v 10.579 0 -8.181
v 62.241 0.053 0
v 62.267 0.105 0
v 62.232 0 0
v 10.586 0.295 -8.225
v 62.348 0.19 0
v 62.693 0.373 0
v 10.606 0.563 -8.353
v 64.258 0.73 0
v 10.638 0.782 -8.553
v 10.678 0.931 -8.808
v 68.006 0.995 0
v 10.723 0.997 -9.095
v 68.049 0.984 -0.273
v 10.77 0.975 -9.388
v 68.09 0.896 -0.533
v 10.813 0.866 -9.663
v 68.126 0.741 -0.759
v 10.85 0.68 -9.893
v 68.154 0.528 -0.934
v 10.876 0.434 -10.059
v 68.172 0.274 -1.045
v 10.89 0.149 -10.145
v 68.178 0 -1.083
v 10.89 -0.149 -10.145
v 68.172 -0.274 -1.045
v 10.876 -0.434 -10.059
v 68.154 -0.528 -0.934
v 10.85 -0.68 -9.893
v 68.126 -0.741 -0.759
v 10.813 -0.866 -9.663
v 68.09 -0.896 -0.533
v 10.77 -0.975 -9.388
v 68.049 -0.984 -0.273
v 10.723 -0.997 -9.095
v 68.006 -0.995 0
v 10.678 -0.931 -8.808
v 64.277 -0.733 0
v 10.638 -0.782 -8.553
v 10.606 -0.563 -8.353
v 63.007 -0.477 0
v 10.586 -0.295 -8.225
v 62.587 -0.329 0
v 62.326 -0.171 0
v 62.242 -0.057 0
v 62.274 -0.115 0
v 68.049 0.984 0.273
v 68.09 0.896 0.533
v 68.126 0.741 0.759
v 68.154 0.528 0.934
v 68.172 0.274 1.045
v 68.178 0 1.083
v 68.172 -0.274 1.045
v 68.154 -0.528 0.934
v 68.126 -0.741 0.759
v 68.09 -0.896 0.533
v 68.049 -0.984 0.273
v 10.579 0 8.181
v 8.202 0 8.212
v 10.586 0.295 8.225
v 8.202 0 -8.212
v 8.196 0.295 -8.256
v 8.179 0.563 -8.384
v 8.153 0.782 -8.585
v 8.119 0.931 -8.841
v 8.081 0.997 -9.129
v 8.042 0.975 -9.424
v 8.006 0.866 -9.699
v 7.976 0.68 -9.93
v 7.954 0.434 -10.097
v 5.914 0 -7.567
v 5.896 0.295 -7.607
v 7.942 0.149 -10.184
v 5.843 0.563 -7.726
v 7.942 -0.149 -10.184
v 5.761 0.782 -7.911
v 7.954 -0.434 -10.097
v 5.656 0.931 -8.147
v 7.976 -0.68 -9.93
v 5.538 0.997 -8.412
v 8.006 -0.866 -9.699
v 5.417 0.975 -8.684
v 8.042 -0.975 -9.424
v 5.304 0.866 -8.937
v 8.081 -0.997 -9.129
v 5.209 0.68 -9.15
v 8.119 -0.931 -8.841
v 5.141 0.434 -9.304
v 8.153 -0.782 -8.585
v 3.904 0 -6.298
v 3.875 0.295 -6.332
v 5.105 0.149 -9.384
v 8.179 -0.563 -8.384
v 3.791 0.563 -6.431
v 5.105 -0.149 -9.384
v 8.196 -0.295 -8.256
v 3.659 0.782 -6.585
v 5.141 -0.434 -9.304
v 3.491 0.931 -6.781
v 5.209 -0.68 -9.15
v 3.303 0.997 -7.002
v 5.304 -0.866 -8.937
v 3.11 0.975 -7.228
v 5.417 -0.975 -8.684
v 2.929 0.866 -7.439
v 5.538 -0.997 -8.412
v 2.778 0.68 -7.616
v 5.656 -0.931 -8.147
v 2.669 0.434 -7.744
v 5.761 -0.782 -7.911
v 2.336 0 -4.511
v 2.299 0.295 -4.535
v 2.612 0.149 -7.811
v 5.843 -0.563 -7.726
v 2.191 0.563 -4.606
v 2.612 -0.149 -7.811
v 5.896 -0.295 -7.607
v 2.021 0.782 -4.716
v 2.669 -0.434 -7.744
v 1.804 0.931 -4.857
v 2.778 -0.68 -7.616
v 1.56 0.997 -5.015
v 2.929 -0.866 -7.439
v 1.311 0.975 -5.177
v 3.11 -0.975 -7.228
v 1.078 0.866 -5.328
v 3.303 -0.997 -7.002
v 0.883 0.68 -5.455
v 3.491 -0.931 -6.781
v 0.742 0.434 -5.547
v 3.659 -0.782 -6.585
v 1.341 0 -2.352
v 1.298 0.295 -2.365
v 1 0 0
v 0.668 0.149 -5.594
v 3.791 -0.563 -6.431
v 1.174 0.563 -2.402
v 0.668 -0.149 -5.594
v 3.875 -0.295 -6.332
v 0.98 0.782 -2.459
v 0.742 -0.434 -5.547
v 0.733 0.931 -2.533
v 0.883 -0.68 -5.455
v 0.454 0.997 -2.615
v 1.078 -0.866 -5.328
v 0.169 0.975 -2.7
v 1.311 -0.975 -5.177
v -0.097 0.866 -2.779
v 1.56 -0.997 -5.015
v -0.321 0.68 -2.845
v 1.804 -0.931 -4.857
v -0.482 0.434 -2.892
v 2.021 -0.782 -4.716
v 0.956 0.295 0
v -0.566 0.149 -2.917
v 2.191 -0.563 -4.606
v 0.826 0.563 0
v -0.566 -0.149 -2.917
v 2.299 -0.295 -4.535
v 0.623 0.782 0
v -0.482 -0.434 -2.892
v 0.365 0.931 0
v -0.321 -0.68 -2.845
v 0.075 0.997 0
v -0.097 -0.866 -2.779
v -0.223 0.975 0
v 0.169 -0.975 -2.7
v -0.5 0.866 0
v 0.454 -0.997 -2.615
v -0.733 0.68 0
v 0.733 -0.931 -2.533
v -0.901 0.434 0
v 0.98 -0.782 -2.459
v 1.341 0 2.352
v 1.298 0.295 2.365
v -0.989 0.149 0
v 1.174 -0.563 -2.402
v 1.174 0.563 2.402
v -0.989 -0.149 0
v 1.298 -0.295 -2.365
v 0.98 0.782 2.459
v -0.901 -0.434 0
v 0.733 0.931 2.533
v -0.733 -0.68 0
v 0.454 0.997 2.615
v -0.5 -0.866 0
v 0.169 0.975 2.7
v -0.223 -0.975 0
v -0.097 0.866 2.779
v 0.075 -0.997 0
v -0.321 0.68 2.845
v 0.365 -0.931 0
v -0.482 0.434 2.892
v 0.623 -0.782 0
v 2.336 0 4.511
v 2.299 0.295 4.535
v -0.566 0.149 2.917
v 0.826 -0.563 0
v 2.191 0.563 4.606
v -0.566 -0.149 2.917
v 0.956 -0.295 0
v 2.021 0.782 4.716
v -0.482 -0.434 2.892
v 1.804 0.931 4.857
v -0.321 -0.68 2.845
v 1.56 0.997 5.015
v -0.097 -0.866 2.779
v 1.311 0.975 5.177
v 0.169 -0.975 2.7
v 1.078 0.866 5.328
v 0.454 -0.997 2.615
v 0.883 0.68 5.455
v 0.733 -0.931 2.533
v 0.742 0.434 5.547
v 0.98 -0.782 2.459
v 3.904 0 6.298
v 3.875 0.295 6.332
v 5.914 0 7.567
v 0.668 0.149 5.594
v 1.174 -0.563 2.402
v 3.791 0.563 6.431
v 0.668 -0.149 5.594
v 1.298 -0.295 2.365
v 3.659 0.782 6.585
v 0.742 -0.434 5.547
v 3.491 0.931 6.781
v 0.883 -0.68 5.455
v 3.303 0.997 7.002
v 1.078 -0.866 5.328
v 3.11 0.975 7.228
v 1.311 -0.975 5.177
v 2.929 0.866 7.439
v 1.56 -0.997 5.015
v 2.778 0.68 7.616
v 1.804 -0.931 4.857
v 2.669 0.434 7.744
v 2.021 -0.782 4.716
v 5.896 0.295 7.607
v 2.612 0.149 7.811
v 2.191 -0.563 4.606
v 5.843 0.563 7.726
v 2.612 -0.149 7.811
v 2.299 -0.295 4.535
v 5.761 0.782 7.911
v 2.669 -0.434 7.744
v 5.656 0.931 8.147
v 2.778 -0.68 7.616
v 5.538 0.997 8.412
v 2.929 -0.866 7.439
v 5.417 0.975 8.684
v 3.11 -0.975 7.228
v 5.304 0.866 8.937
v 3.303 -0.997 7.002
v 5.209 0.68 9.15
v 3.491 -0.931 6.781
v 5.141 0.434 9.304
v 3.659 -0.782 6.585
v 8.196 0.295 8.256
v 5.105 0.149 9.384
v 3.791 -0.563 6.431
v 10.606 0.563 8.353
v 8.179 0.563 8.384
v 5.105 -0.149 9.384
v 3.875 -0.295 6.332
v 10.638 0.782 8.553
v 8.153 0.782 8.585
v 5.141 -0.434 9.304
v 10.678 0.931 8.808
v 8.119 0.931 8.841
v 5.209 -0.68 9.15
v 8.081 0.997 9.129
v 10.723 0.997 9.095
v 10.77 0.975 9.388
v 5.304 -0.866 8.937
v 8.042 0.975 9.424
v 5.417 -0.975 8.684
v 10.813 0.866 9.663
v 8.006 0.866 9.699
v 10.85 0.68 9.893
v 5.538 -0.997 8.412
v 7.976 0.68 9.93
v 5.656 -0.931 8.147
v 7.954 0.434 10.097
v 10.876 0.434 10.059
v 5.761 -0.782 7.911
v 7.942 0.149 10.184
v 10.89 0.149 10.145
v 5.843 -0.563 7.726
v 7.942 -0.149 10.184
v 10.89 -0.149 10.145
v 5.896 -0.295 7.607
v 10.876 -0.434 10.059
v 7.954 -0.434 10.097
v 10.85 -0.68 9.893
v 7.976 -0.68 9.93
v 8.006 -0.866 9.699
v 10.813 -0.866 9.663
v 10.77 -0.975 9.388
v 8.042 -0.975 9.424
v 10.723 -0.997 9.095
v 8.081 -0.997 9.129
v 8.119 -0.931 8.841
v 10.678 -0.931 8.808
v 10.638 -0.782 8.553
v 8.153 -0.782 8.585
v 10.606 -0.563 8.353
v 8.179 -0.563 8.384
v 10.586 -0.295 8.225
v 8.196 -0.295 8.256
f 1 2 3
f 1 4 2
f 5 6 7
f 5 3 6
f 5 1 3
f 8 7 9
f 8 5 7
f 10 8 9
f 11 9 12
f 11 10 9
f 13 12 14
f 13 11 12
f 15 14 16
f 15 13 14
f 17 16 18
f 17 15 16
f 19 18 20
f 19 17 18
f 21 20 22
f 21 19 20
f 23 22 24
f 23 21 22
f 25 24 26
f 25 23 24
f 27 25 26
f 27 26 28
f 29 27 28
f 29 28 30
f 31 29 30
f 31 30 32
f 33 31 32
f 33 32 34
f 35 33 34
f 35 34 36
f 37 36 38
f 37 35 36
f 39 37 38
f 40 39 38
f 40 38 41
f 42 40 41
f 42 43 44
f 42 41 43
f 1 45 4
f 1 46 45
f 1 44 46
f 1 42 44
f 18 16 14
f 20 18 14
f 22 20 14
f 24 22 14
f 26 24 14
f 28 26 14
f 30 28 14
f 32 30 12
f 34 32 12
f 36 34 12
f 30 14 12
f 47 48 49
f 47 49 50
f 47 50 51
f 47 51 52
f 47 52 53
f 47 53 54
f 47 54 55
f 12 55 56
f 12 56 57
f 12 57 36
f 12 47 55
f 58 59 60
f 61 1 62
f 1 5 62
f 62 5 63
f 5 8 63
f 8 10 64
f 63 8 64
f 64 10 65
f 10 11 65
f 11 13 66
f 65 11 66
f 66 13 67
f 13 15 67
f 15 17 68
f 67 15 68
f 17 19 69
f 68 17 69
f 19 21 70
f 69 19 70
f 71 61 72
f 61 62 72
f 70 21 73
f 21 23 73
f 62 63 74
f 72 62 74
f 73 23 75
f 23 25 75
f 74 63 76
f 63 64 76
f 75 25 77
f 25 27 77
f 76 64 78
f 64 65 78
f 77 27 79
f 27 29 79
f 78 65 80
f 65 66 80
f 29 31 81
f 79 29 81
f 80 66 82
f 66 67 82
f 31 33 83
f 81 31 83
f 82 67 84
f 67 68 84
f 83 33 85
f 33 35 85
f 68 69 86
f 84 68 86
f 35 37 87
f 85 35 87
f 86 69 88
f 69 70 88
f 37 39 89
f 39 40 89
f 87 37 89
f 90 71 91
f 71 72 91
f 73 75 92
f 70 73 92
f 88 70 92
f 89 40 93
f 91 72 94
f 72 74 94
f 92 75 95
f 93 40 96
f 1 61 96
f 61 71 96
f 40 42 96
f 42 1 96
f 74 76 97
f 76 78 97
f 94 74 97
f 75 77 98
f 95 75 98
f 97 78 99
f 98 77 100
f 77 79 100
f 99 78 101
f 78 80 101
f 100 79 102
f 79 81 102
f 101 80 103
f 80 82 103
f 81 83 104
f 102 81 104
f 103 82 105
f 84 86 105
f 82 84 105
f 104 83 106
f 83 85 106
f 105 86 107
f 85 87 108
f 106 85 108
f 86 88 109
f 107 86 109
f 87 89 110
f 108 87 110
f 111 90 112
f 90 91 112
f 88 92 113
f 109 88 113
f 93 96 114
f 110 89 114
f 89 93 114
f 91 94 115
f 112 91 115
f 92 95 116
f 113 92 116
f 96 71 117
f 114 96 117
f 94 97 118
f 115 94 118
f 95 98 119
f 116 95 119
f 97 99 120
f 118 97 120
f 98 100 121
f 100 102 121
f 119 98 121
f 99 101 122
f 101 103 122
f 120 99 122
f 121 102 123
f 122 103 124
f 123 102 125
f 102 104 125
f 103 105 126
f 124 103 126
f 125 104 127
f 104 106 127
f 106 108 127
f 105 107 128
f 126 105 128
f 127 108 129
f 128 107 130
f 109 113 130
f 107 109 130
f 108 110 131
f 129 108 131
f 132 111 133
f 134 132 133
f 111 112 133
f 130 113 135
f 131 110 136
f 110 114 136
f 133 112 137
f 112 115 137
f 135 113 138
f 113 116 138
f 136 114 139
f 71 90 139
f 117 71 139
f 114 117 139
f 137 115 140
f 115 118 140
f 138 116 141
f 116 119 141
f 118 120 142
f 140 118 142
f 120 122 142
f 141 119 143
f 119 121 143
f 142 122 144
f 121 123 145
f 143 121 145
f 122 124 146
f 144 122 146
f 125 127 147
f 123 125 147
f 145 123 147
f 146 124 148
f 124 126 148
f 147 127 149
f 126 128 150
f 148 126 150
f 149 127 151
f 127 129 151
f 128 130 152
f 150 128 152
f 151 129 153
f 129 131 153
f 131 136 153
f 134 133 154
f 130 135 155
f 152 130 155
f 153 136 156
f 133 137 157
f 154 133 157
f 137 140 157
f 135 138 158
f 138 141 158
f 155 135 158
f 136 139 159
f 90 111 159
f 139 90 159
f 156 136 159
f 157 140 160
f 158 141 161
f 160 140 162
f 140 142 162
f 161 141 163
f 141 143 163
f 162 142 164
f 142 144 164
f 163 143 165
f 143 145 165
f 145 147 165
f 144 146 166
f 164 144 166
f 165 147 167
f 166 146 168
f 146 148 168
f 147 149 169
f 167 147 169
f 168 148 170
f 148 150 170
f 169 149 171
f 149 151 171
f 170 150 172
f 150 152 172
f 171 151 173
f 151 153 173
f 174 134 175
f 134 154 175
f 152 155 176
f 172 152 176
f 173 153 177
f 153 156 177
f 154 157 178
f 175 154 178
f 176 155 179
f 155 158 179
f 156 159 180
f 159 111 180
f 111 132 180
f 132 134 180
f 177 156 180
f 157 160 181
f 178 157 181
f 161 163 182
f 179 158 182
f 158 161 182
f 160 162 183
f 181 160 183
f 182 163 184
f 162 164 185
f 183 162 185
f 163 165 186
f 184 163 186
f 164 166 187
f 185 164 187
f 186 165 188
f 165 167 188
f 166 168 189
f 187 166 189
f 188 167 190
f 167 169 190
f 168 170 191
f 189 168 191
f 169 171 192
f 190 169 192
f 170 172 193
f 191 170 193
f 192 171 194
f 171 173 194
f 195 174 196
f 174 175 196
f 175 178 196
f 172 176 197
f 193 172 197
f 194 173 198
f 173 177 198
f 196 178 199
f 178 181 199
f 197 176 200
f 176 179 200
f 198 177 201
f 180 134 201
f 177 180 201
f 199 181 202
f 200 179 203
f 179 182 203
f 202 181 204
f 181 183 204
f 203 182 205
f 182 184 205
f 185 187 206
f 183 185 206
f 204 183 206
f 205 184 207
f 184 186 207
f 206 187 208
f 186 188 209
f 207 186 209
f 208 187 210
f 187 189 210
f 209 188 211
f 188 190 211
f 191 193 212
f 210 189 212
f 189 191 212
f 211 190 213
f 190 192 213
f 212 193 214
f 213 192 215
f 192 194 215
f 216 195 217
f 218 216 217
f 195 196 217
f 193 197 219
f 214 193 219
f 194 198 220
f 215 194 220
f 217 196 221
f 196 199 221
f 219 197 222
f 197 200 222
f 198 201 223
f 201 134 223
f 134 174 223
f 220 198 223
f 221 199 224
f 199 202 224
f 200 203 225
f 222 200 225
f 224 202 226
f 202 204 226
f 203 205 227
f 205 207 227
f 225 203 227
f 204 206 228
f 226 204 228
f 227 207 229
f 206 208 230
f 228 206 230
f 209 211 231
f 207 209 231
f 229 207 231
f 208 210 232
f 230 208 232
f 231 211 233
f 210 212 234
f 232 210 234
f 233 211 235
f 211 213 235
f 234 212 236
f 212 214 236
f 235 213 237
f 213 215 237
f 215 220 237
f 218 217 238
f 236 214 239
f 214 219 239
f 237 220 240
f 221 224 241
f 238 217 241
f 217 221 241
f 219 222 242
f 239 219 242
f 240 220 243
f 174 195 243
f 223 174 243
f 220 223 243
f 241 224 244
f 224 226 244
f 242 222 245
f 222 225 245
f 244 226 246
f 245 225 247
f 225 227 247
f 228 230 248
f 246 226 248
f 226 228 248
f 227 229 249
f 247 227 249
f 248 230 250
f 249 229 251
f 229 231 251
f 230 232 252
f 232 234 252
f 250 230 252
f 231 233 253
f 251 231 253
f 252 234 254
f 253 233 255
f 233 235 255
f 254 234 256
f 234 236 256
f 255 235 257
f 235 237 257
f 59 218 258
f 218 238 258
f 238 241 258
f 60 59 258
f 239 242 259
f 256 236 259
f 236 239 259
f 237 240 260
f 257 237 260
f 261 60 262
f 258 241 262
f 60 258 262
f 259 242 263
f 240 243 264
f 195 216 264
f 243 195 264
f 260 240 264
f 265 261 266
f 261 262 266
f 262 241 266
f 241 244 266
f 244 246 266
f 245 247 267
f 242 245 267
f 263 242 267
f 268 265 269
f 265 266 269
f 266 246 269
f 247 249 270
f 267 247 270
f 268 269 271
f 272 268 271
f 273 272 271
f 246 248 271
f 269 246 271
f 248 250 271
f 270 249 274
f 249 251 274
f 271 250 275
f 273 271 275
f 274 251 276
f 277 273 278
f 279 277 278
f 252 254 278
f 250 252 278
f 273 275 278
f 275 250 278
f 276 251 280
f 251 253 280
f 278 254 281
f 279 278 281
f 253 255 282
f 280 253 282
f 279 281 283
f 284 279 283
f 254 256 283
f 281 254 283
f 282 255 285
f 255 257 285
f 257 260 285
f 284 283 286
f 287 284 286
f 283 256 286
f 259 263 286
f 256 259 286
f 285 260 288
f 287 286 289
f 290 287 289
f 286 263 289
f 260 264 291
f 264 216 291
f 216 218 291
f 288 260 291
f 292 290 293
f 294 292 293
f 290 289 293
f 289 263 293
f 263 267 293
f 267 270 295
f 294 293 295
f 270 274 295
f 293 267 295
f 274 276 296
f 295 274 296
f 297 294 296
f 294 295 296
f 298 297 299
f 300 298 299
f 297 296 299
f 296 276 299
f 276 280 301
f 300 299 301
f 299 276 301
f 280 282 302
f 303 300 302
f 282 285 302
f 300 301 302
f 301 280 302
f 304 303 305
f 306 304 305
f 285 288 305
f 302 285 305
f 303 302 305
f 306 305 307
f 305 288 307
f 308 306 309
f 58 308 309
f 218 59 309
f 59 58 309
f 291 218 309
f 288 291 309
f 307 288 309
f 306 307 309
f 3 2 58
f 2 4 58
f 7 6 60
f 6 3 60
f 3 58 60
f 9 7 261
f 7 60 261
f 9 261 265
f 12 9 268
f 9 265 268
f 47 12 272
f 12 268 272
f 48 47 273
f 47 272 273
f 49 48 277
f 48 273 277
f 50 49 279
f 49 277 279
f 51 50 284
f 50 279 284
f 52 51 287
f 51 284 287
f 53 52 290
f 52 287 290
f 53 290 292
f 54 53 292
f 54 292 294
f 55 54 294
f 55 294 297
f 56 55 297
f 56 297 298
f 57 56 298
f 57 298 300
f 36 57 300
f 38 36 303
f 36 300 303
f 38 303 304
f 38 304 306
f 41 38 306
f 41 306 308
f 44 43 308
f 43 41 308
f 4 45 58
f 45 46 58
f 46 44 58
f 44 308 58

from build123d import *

# Parameters (mm, degrees)
F0_R          = 1
F1_ANGLE_BACK = 99
F1_ANGLE      = 198
F2_DEPTH      = 58
F3_DEPTH      = 58


with BuildPart() as f1:
    # F0 (on Top) → F1 (revolve)
    with BuildSketch(Plane.XY, mode=Mode.PRIVATE) as f1_sk:
        Circle(F0_R)
    revolve(f1_sk.sketch.rotate(Axis((9.283, 0.6793318316, 0), (0, 1, 0)), -F1_ANGLE_BACK), axis=Axis((9.283, 0.6793318316, 0), (0, 1, 0)), revolution_arc=F1_ANGLE)

    # F2 (add): a face of the model
    f2_faces = [f1.faces().sort_by_distance(p)[0] for p in [
        (10.735181139, 0, 9.1687108657),
    ]]
    extrude(f2_faces, amount=F2_DEPTH)

    # F3 (add): a face of the model
    f3_faces = [f1.faces().sort_by_distance(p)[0] for p in [
        (10.735181139, 0, -9.1687108657),
    ]]
    extrude(f3_faces, amount=F3_DEPTH)


solid = f1.part
